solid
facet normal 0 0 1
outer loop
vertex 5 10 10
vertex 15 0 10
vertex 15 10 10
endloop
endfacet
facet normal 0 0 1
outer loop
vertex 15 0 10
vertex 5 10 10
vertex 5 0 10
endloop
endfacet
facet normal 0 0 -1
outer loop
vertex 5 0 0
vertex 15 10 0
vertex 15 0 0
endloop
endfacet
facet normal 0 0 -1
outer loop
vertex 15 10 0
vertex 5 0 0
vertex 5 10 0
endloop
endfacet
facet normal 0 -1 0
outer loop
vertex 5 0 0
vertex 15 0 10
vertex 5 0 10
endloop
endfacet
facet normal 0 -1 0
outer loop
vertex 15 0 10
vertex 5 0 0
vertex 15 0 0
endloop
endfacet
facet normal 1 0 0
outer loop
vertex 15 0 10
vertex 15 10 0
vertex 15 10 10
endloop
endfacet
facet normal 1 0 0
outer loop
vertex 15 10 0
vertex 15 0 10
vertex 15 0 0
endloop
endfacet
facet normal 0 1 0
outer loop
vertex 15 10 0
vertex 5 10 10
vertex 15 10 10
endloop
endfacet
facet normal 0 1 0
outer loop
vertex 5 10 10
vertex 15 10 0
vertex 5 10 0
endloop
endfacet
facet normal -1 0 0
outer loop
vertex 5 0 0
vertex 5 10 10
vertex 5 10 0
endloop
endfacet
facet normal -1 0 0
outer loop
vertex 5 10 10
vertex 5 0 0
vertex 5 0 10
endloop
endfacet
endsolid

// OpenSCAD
translate([5.0, 0, 0]) {
  cube([10.0, 10.0, 10.0]);
}
$fn = 50;
